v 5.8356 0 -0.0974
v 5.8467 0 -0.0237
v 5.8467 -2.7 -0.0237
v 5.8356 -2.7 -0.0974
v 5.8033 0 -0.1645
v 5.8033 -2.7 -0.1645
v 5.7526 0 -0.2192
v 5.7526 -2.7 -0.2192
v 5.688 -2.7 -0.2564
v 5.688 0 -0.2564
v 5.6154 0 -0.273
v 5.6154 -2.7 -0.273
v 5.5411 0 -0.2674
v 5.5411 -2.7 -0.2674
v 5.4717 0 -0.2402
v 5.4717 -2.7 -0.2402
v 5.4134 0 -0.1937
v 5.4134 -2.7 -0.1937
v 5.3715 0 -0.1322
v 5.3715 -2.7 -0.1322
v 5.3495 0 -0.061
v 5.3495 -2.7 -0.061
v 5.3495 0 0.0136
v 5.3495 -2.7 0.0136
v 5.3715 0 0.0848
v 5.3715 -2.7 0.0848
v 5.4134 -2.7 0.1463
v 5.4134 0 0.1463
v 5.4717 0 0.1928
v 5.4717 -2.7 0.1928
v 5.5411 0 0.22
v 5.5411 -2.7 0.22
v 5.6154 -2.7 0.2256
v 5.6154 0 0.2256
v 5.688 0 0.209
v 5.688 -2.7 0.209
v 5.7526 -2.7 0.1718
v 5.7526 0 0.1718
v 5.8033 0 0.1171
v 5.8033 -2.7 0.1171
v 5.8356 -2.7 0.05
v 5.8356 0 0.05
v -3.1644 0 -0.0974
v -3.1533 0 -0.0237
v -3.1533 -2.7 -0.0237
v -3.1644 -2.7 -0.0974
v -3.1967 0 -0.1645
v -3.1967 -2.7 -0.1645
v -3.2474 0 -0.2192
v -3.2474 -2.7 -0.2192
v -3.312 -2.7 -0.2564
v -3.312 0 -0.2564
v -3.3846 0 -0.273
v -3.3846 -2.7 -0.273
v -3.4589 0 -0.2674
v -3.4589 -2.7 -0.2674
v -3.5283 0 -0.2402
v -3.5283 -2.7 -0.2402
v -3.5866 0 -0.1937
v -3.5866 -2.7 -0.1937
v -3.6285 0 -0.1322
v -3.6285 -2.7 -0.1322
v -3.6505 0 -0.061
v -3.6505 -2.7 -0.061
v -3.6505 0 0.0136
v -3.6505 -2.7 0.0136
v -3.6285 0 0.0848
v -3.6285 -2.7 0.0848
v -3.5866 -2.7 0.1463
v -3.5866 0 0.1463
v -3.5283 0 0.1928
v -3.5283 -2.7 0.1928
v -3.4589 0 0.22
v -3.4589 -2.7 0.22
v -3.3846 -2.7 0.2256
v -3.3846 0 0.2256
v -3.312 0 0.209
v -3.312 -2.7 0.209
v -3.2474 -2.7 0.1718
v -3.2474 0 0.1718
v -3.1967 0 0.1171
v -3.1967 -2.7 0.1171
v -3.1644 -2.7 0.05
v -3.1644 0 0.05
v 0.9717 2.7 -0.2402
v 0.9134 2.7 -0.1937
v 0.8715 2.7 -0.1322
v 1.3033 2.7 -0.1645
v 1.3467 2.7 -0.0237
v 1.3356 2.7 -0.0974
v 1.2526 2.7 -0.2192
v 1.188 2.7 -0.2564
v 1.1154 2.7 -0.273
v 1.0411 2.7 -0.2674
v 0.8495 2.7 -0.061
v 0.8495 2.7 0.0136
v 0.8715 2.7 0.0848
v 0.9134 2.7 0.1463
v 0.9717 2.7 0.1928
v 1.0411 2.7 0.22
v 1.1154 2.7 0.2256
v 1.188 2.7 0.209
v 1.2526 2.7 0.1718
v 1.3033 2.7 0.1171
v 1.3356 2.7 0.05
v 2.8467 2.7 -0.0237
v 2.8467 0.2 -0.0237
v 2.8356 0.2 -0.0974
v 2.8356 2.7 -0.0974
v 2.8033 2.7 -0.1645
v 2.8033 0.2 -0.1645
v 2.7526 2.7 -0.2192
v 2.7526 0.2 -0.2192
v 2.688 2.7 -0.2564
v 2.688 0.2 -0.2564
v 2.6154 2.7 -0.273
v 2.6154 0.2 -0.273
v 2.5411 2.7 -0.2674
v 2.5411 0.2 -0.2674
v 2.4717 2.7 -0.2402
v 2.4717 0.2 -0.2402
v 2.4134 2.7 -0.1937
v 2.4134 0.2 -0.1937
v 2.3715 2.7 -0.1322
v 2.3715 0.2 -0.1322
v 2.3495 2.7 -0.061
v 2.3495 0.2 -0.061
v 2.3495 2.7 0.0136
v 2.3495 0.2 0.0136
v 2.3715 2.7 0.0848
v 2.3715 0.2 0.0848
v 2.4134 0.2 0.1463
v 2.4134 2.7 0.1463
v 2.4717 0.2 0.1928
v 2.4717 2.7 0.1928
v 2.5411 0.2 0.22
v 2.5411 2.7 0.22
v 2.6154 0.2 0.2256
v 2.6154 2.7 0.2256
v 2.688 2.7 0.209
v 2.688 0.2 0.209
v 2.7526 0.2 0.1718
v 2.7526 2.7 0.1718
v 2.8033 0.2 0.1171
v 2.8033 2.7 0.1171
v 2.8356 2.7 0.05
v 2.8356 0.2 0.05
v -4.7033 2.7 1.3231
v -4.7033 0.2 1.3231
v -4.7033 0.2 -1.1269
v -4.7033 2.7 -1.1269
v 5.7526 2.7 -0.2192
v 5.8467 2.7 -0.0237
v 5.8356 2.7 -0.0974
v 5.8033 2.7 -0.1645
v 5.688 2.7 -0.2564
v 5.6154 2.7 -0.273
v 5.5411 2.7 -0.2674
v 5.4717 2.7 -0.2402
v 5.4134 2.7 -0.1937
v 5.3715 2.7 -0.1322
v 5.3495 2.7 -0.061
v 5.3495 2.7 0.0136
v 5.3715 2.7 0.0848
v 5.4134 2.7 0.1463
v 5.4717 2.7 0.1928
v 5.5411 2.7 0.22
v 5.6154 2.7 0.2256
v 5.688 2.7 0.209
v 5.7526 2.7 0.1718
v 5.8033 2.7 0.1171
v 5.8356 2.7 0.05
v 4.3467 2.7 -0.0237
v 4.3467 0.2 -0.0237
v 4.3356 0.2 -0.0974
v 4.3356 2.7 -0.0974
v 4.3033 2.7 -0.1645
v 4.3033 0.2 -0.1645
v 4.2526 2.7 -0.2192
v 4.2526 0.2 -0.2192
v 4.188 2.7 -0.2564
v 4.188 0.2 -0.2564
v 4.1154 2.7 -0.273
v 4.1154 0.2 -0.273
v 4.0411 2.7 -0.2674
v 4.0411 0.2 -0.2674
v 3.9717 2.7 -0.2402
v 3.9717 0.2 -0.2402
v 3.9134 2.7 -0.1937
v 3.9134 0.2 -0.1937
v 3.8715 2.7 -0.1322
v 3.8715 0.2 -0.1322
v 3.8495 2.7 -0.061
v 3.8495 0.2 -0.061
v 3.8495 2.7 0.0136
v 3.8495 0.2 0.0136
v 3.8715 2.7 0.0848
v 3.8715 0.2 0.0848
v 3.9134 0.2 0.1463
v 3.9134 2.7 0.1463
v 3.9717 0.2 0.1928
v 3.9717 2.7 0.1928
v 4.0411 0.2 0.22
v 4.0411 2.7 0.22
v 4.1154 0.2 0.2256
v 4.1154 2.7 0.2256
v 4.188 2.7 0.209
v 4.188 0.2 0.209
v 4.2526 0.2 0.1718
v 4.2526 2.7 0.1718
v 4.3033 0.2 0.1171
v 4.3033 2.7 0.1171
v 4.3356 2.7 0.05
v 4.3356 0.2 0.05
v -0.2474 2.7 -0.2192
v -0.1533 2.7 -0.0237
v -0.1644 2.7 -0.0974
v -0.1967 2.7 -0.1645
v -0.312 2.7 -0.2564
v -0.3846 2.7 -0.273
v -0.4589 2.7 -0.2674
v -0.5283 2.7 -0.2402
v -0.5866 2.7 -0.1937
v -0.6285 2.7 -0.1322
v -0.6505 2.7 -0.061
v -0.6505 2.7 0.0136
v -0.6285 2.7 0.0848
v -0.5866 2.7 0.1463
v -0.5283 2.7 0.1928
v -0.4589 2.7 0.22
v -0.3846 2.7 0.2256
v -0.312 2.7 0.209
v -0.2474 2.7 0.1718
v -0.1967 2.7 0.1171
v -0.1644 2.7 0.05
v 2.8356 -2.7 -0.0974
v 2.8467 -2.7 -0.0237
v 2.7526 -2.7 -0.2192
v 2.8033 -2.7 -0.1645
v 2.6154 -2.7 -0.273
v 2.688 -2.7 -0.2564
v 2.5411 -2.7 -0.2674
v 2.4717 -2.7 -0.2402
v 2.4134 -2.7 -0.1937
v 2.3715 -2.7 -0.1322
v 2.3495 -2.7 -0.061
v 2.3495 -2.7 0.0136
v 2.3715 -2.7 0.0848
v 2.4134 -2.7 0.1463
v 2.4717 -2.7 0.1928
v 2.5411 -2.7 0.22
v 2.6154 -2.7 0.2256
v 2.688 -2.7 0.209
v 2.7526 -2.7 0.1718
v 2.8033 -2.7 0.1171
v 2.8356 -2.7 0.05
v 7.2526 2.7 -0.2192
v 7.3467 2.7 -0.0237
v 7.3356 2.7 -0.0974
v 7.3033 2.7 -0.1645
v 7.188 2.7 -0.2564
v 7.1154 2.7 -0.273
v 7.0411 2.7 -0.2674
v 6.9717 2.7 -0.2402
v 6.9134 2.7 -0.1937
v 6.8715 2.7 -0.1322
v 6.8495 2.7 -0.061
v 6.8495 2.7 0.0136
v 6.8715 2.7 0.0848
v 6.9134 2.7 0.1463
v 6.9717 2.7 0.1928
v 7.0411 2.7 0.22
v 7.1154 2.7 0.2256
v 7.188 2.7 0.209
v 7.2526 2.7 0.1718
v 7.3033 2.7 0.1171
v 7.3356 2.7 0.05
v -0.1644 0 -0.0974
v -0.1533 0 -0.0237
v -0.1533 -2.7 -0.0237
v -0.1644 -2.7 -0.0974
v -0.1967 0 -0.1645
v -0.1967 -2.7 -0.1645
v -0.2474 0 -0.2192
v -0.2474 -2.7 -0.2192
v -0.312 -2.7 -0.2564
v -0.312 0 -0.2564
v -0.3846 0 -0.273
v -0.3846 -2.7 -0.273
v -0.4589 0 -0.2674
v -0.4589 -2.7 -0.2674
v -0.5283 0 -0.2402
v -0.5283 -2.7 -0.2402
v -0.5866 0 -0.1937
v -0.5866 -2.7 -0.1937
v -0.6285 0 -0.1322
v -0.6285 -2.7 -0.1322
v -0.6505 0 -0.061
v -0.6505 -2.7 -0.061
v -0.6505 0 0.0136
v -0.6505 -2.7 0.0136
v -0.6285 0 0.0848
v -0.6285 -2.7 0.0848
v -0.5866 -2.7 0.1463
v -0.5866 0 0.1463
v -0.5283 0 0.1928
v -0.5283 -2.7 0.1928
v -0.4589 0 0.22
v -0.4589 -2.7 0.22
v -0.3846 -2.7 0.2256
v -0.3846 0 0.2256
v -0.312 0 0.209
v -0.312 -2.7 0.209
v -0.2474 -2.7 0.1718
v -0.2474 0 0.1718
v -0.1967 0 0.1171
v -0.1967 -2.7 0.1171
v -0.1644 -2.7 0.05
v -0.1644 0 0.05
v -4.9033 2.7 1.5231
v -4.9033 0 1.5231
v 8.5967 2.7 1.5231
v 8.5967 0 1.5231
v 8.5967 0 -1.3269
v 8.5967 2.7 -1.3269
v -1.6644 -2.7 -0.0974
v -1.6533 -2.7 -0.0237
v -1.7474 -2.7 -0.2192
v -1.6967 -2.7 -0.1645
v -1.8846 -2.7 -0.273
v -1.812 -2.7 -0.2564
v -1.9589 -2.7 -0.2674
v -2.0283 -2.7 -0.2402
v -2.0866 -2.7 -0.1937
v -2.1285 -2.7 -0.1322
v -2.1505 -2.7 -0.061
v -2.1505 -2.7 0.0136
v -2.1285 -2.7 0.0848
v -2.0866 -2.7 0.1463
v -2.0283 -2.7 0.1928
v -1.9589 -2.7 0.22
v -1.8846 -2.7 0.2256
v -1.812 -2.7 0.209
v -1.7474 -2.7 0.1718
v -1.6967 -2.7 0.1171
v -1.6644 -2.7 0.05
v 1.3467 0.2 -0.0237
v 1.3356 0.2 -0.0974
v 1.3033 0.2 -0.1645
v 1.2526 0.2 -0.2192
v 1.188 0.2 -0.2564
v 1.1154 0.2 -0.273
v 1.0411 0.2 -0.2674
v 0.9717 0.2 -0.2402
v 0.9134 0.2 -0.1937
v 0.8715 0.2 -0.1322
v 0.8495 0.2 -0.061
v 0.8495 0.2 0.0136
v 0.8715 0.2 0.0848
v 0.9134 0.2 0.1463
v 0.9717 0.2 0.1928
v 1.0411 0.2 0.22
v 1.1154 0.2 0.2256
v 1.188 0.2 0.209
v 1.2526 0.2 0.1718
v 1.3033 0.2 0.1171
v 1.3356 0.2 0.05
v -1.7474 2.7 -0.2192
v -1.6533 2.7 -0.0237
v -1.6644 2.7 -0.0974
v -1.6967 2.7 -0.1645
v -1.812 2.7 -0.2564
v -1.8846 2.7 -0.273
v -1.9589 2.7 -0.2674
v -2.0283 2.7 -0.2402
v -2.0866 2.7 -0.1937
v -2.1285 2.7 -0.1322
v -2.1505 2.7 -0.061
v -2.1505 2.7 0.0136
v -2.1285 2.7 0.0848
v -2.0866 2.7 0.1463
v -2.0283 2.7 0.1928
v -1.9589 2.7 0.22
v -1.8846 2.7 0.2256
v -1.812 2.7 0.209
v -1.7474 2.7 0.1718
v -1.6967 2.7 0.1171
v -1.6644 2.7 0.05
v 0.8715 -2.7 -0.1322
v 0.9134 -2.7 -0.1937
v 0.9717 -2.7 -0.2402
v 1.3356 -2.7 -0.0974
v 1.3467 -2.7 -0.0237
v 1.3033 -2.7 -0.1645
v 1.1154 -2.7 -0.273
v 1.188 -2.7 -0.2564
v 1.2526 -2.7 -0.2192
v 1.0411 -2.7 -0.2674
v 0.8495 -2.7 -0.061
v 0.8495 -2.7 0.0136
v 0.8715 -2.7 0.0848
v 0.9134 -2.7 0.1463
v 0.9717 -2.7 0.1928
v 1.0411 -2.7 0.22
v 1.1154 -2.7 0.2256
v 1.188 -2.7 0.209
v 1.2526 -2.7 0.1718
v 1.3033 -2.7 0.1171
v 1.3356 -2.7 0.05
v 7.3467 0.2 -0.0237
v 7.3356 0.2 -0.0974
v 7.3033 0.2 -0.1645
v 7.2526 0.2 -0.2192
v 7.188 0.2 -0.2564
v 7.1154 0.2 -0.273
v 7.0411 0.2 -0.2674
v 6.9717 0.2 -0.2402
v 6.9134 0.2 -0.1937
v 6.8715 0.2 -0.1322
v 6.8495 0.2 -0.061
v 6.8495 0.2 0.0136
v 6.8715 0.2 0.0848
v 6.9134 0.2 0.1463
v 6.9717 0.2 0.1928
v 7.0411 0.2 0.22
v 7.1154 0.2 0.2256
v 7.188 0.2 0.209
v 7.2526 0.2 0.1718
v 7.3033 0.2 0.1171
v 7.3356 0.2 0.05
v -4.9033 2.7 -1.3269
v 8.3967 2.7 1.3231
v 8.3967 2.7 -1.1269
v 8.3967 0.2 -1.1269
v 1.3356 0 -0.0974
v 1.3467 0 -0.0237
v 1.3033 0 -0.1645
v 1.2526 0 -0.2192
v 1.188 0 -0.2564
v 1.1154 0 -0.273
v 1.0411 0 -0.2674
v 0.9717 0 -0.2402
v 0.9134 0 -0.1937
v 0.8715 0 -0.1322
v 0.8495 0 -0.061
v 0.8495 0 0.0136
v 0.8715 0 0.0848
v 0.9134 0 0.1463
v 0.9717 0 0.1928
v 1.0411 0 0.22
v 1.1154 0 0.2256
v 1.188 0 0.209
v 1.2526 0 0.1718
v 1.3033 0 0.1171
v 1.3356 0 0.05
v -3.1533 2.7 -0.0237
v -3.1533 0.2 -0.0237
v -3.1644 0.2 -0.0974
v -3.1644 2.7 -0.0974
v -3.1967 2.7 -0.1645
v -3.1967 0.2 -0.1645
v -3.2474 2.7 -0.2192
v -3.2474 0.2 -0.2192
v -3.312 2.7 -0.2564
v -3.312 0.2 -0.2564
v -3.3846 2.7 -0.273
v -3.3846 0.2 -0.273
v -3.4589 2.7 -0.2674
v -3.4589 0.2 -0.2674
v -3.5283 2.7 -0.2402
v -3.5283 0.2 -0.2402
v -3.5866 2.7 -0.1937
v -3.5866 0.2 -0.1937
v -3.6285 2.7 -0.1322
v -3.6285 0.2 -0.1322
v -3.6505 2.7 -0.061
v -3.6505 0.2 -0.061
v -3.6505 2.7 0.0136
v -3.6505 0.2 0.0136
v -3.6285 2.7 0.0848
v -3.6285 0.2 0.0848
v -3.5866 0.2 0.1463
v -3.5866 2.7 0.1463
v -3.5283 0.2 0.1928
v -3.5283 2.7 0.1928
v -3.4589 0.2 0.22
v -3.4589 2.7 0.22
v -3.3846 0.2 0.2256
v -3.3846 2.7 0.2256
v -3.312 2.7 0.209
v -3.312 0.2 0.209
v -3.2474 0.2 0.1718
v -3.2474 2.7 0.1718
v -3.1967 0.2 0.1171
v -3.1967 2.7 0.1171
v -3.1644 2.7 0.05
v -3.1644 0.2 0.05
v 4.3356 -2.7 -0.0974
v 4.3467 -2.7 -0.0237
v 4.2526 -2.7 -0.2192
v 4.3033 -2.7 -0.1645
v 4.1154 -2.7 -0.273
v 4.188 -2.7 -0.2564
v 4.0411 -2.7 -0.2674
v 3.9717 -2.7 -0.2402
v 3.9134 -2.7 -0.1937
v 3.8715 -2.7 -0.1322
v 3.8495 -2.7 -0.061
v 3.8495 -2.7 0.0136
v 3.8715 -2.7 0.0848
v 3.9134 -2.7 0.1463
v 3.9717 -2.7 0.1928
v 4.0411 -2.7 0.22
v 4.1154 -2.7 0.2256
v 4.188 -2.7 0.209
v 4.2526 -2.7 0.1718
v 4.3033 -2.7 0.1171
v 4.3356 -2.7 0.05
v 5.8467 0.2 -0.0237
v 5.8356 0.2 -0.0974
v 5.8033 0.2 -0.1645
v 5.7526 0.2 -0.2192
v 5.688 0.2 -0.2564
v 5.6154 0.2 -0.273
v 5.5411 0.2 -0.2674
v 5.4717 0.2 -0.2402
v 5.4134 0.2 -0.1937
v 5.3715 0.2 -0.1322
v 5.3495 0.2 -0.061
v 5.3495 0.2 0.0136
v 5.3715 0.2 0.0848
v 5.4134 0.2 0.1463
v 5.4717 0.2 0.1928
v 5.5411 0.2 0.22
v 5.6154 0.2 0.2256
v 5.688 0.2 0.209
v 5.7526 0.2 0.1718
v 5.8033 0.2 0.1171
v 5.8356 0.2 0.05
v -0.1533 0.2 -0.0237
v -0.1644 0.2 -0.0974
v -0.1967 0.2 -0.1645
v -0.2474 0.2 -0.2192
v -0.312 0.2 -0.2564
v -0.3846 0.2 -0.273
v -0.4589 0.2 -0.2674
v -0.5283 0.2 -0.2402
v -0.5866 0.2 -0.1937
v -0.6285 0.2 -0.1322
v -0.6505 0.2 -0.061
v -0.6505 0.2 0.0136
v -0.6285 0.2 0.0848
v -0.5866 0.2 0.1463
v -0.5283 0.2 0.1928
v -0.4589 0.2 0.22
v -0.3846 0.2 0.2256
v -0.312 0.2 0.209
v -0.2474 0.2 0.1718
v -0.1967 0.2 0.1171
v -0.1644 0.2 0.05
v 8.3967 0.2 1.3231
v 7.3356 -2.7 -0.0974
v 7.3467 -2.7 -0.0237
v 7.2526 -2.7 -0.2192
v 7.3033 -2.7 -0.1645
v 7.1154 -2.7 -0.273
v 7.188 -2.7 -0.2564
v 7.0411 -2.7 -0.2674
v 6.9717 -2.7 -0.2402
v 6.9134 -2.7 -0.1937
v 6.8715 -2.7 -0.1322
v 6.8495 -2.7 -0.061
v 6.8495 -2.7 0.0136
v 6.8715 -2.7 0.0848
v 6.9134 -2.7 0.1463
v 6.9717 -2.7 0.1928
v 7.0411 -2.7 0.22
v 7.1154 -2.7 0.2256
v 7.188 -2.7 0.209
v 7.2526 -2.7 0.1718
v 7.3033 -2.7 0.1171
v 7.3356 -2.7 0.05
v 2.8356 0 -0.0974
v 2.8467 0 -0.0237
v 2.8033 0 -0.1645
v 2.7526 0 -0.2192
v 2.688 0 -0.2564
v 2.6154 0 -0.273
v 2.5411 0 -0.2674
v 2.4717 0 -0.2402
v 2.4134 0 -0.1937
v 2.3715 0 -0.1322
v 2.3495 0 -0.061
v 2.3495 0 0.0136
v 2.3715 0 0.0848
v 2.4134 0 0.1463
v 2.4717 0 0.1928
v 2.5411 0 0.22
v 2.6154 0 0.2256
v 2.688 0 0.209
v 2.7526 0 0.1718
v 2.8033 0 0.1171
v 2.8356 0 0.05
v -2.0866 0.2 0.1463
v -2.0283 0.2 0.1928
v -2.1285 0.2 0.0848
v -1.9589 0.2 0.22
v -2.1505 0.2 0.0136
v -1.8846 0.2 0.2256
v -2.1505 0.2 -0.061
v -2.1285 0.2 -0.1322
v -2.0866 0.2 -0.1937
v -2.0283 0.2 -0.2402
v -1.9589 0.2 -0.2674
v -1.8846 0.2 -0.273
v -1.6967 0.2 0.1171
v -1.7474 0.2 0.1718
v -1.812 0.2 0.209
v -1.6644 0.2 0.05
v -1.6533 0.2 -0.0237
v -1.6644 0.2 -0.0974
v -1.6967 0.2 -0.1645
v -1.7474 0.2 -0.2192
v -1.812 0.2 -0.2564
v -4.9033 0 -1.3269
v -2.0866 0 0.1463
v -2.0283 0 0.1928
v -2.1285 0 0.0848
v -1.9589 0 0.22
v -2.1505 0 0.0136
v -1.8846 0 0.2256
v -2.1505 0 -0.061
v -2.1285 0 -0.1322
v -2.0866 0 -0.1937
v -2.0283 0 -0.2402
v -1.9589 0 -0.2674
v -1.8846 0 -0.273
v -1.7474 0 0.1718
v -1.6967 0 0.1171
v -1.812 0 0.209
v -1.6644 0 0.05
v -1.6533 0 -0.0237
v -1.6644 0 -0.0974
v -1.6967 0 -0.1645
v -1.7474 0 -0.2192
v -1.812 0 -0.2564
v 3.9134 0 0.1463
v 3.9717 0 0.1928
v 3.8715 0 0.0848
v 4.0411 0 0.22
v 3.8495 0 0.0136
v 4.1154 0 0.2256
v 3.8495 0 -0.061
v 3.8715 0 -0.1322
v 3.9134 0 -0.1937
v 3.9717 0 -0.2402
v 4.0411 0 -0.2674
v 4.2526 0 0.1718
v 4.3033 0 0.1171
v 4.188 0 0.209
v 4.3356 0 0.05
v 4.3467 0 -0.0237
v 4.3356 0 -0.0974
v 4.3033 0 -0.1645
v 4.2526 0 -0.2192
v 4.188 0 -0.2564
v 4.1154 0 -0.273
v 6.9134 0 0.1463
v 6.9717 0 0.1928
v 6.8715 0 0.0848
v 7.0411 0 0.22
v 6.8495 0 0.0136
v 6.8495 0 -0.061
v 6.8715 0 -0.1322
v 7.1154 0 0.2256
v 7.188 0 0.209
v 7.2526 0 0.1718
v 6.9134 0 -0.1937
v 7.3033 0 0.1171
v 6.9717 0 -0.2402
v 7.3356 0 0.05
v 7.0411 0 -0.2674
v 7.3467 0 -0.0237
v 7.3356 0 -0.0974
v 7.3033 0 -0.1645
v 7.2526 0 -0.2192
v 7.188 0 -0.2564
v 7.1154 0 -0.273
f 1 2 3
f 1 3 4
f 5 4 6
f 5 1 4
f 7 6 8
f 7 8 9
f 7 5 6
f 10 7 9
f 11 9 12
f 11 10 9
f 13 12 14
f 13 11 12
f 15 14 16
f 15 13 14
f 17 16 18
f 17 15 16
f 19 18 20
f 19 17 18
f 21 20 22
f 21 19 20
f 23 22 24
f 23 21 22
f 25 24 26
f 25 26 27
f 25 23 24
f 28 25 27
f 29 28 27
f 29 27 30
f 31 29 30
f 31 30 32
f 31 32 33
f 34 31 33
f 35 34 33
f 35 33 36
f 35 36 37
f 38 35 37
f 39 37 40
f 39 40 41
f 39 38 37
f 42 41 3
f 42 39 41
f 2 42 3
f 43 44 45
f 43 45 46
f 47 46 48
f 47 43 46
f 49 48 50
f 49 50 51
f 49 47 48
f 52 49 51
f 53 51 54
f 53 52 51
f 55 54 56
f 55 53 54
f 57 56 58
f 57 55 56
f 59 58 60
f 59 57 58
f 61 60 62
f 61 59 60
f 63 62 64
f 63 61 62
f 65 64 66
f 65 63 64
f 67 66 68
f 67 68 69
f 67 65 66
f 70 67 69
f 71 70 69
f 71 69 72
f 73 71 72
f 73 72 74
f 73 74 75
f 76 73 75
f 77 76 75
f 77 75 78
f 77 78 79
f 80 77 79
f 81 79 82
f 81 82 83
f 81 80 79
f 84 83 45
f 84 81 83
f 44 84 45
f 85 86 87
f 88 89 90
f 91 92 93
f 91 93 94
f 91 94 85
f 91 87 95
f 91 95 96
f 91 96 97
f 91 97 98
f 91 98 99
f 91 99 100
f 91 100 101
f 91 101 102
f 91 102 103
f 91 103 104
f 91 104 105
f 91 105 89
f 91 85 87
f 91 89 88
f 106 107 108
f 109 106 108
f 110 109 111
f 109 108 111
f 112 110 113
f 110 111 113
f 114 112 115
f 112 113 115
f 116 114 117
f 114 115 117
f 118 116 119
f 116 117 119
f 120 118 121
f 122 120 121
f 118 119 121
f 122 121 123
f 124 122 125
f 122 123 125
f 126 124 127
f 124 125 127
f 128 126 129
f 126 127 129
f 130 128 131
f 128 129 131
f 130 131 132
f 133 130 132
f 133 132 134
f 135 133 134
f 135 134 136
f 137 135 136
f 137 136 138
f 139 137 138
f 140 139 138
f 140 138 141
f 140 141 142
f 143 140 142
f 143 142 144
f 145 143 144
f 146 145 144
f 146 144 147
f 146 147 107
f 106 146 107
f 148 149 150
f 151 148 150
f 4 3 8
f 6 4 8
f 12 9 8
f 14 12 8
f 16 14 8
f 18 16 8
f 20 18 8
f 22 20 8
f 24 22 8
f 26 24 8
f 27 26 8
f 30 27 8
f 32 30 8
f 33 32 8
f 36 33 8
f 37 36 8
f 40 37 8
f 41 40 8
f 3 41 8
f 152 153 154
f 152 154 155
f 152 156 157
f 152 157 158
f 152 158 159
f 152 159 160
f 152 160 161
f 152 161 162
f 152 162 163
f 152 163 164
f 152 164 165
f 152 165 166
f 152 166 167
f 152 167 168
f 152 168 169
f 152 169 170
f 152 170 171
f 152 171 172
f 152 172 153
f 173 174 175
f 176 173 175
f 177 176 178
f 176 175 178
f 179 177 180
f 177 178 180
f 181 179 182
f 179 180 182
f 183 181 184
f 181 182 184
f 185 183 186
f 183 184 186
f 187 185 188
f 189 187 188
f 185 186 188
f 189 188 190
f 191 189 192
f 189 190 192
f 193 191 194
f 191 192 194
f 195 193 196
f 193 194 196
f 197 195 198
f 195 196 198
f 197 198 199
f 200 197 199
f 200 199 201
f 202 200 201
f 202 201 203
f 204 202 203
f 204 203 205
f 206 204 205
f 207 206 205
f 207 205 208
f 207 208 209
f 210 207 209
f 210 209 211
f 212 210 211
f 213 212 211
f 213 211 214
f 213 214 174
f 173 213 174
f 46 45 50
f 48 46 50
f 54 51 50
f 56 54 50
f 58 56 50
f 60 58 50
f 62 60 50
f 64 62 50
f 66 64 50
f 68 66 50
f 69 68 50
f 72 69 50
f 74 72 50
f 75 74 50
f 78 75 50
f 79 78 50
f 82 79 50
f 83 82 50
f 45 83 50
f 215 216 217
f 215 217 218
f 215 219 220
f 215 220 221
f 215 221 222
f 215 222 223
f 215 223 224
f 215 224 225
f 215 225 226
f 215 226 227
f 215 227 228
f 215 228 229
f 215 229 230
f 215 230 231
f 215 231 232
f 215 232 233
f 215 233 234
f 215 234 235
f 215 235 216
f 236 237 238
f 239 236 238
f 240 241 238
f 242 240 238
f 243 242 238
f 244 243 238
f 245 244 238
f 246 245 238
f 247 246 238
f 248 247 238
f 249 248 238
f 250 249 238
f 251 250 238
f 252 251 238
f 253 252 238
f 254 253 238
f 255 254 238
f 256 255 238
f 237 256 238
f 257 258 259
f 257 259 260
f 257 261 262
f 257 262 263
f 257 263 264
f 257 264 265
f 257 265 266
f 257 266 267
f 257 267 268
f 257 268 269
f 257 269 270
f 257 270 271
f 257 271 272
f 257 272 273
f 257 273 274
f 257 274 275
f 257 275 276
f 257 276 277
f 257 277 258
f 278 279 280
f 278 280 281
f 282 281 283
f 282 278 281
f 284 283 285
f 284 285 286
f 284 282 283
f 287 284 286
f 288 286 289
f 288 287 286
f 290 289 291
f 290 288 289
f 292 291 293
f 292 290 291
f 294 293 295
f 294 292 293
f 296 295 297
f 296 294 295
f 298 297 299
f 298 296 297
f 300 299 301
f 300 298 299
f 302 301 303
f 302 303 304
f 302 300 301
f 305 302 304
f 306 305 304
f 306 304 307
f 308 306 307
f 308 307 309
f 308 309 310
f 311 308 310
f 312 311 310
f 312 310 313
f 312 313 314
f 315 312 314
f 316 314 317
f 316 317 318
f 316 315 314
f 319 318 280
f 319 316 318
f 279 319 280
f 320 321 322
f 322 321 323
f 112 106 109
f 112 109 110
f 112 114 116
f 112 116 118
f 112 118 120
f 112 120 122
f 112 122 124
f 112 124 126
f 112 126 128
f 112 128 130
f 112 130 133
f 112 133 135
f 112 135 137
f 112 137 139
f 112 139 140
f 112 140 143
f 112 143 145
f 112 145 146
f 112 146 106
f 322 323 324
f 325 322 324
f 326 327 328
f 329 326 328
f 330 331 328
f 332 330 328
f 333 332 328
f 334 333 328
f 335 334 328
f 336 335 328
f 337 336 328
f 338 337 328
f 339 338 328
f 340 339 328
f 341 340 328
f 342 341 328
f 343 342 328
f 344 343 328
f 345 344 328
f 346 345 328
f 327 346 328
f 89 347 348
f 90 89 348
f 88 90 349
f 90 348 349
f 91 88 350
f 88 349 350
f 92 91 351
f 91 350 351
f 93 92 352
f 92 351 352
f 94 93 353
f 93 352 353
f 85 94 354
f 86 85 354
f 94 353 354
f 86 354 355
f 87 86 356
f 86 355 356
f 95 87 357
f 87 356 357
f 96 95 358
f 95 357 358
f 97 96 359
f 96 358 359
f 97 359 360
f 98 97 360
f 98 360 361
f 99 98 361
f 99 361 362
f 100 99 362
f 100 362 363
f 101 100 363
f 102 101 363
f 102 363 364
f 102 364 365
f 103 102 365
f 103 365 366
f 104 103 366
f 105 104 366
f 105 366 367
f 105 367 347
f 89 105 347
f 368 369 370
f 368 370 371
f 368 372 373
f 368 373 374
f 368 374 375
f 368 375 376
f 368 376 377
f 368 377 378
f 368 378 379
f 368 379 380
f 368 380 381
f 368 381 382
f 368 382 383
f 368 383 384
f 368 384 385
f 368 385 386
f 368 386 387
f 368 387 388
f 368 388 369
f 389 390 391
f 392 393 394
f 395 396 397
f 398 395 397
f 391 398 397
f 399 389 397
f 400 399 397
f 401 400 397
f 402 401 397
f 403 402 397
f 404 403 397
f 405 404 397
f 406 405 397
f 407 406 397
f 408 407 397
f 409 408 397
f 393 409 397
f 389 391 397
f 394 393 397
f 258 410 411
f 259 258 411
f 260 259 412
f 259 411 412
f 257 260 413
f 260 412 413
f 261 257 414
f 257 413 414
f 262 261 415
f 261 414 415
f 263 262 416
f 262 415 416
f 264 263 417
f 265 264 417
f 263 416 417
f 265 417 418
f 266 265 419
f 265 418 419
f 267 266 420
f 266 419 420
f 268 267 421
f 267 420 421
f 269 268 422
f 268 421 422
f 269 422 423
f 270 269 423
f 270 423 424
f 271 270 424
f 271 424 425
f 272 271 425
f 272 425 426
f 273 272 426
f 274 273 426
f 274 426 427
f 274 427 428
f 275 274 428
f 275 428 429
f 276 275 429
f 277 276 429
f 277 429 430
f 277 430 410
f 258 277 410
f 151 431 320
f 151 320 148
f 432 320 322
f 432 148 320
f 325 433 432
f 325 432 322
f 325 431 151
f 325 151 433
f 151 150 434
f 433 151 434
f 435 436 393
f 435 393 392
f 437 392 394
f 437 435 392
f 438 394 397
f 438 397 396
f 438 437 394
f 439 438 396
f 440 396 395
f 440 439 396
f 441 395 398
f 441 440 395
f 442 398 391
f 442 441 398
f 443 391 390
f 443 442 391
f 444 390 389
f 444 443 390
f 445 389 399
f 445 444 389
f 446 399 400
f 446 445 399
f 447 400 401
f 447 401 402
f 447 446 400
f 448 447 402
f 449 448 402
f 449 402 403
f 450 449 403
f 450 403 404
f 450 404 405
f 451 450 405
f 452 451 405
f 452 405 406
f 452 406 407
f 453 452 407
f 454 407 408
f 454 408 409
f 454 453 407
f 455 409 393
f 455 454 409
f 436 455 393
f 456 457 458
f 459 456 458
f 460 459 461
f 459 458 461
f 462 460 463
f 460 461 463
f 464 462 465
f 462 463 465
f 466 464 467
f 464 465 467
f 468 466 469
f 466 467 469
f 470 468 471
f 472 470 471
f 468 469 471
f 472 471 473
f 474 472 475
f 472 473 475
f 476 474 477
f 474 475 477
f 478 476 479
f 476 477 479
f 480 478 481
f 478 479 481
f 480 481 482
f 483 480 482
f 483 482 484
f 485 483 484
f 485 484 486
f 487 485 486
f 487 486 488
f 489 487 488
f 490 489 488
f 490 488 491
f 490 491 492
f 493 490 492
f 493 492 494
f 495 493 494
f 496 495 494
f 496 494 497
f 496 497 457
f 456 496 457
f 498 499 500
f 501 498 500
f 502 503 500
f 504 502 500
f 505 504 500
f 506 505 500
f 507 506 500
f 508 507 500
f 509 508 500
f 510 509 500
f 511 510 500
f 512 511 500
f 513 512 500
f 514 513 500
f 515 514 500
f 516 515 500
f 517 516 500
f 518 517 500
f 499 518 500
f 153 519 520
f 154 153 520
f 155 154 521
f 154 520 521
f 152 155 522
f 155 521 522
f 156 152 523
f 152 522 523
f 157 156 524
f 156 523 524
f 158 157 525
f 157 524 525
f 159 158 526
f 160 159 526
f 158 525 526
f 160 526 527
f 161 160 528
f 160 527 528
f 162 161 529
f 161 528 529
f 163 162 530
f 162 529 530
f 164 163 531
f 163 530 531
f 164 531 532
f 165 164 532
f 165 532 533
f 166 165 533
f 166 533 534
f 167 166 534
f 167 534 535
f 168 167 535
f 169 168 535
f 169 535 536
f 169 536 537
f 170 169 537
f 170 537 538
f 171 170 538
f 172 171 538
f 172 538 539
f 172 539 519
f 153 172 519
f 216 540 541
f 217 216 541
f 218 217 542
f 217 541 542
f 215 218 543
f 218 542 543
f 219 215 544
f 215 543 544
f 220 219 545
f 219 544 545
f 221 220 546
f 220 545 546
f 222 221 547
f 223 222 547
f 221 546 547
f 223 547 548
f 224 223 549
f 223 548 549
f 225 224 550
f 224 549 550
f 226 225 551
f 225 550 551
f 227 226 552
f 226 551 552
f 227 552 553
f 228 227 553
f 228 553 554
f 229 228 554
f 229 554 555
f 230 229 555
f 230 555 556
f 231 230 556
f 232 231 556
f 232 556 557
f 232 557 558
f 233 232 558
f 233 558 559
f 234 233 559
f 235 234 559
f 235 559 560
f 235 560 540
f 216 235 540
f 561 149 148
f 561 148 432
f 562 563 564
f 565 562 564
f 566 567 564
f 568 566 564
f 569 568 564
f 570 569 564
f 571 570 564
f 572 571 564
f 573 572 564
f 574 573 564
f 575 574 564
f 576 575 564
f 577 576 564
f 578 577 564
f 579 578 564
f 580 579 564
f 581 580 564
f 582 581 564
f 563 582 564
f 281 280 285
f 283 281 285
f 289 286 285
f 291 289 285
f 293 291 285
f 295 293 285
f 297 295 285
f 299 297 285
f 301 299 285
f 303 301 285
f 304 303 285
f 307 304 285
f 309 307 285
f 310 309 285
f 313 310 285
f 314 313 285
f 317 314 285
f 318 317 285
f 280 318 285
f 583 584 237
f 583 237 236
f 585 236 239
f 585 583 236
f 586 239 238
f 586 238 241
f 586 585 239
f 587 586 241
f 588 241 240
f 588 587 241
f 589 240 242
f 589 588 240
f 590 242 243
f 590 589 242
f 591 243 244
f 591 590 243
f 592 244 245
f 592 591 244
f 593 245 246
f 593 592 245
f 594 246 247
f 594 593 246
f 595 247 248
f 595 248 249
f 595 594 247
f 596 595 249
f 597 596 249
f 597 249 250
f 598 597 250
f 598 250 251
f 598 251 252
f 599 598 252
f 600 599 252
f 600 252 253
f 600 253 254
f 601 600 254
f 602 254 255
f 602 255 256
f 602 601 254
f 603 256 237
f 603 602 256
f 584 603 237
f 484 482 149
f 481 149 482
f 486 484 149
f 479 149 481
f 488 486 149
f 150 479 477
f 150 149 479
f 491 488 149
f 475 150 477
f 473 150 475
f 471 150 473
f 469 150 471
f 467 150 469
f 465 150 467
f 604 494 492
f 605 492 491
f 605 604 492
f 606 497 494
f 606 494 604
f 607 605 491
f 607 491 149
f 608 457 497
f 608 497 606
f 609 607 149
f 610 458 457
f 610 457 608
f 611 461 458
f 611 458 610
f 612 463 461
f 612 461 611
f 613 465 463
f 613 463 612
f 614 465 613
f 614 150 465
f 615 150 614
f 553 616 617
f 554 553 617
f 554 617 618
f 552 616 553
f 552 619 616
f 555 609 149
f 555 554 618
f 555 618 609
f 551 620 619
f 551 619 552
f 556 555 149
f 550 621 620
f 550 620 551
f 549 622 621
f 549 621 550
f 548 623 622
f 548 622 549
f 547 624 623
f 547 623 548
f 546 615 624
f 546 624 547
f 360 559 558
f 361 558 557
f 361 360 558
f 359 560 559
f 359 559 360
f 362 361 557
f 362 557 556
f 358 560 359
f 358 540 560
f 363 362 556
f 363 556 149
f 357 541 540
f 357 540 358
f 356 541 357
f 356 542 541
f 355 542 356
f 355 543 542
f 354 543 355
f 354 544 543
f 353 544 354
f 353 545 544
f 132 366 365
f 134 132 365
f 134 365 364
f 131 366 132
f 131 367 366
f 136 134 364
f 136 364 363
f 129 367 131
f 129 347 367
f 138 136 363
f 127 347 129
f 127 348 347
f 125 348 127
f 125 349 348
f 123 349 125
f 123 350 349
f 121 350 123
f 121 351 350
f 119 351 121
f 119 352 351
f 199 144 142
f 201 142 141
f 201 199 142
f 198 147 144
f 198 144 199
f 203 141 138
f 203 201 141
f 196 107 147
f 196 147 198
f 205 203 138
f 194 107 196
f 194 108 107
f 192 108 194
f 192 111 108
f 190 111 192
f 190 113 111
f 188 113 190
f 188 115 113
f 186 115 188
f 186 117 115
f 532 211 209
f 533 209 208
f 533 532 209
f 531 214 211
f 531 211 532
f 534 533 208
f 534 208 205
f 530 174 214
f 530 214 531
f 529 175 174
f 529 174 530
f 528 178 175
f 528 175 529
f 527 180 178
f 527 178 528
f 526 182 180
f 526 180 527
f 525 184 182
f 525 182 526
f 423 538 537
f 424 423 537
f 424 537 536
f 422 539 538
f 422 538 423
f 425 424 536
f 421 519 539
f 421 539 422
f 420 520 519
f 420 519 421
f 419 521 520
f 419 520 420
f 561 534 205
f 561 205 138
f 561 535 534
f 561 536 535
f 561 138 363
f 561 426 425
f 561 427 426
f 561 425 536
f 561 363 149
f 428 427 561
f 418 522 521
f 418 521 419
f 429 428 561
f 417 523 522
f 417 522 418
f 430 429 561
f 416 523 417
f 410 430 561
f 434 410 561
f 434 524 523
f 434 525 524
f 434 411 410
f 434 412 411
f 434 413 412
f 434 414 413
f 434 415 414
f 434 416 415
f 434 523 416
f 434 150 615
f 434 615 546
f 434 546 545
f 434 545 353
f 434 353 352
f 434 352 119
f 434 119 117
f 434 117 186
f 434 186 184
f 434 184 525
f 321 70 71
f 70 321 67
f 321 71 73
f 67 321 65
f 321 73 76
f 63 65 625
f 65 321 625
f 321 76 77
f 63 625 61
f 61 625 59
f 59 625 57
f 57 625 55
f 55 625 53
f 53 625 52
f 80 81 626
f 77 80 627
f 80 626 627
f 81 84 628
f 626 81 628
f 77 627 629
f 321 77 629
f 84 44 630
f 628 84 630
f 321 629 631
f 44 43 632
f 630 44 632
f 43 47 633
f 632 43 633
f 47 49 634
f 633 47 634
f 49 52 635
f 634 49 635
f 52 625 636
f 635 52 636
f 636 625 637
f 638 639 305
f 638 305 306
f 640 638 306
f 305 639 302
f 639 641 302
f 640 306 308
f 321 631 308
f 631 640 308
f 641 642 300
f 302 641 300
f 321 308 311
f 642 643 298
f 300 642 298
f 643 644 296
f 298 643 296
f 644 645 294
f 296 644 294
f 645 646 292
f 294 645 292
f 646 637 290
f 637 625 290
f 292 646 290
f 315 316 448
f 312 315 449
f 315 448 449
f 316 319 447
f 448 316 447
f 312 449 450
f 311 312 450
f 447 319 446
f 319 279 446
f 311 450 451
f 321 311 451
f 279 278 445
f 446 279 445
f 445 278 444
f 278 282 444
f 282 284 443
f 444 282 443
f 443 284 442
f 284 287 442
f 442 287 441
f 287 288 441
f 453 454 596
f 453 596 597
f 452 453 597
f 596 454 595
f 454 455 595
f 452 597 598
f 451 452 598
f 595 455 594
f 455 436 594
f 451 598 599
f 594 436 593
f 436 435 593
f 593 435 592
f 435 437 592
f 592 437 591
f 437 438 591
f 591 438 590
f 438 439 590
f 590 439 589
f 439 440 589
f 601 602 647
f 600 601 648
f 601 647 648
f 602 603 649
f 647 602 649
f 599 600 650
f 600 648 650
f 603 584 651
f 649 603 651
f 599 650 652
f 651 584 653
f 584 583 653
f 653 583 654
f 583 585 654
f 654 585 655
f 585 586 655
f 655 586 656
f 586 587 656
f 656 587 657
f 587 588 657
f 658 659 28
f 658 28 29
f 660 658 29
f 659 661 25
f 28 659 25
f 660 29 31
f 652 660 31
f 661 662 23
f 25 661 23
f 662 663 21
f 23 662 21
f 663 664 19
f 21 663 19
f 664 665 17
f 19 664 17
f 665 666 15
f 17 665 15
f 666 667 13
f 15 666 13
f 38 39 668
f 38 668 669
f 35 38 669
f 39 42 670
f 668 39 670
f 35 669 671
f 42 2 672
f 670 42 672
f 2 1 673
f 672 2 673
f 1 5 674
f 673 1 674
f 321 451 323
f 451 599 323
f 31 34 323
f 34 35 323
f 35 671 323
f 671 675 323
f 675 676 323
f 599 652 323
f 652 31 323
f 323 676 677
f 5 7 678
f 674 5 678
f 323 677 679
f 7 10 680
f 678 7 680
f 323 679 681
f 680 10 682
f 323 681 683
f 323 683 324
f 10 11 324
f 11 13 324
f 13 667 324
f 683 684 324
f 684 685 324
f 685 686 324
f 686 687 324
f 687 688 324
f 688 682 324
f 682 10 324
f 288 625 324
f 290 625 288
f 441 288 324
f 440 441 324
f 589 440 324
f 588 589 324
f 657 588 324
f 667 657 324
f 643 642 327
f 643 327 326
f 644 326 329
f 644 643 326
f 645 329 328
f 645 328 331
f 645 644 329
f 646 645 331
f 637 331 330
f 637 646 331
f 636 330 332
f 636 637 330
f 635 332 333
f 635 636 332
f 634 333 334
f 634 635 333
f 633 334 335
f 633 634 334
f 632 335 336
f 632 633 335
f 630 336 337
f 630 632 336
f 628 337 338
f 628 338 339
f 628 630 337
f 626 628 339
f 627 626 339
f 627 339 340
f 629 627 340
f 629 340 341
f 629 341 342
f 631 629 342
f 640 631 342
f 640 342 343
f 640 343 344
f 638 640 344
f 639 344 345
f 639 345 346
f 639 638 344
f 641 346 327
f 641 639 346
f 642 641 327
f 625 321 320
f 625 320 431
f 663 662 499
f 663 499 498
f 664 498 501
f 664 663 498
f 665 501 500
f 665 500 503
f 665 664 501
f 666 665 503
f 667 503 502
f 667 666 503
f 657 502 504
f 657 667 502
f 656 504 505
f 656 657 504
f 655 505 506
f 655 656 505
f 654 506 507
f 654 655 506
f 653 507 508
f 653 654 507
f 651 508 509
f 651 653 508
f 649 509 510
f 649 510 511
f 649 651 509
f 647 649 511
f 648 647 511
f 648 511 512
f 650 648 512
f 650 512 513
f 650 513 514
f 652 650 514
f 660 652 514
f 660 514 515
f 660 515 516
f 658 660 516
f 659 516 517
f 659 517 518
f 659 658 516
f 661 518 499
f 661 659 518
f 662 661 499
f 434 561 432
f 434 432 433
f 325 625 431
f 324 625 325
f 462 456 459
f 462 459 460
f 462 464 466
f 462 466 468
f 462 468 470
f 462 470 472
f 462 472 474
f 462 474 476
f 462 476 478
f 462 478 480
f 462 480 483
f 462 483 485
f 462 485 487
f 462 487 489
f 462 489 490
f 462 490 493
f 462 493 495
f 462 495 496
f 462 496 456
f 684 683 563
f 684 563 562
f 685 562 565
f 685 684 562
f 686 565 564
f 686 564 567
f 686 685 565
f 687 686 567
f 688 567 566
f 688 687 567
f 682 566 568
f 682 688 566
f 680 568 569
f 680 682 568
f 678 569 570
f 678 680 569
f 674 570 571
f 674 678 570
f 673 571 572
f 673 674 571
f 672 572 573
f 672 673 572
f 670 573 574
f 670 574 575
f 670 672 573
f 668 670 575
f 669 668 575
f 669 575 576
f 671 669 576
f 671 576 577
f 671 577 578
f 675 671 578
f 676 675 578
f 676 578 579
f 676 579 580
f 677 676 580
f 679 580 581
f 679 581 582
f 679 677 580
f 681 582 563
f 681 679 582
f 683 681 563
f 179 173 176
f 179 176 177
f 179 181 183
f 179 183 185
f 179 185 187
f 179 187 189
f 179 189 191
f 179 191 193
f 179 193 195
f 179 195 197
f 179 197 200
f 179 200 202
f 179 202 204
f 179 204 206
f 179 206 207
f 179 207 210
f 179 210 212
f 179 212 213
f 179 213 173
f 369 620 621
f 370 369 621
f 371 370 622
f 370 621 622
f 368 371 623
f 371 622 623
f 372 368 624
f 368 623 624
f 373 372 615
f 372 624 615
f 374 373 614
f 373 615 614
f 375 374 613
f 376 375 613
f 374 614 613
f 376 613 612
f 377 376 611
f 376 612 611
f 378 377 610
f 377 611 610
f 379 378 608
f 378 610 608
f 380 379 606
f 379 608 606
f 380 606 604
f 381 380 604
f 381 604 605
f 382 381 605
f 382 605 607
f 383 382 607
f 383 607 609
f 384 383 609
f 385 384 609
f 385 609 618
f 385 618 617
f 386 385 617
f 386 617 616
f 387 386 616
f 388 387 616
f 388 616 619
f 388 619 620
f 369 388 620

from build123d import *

# Parameters (mm, degrees)
SKETCH1_R             = 0.25
BOSS_EXTRUDE1_DEPTH   = 2.7
BOSS_EXTRUDE1_2_DEPTH = 2.7
BOSS_EXTRUDE1_3_DEPTH = 2.7
BOSS_EXTRUDE1_4_DEPTH = 2.7
BOSS_EXTRUDE1_5_DEPTH = 2.7
BOSS_EXTRUDE1_6_DEPTH = 2.7
BOSS_EXTRUDE1_7_DEPTH = 2.7
BOSS_EXTRUDE1_8_DEPTH = 2.7
SKETCH1_7_W           = 13.5
SKETCH1_7_H           = 2.85
SKETCH1_7_W_2         = 13.1
SKETCH1_7_H_2         = 2.45
BOSS_EXTRUDE3_DEPTH   = 2.7
BOSS_EXTRUDE4_START   = 0.2
SKETCH1_8_W           = 13.1
SKETCH1_8_H           = 2.45
SKETCH1_8_R           = 0.25
BOSS_EXTRUDE4_DEPTH   = 0.2
BOSS_EXTRUDE5_START   = 2.7
SKETCH1_9_R           = 0.25
BOSS_EXTRUDE5_DEPTH   = 2.7


with BuildPart() as part:
    # Sketch1 → Boss-Extrude1 (new body)
    with BuildSketch(Plane(origin=(0, 0, 0), x_dir=(1, 0, 0), z_dir=(0, 1, 0))):
        with Locations((-3.403301887, 0.02370283)):
            Circle(SKETCH1_R)
    extrude(amount=-BOSS_EXTRUDE1_DEPTH)



with BuildPart() as body_2:
    # Sketch1 → Boss-Extrude1 2 (new body)
    with BuildSketch(Plane(origin=(0, 0, 0), x_dir=(1, 0, 0), z_dir=(0, 1, 0))):
        with Locations((-1.903301887, 0.02370283)):
            Circle(SKETCH1_R)
    extrude(amount=-BOSS_EXTRUDE1_2_DEPTH)


with BuildPart() as body_3:
    # Sketch1 → Boss-Extrude1 3 (new body)
    with BuildSketch(Plane(origin=(0, 0, 0), x_dir=(1, 0, 0), z_dir=(0, 1, 0))):
        with Locations((-0.403301887, 0.02370283)):
            Circle(SKETCH1_R)
    extrude(amount=-BOSS_EXTRUDE1_3_DEPTH)


with BuildPart() as body_4:
    # Sketch1 → Boss-Extrude1 4 (new body)
    with BuildSketch(Plane(origin=(0, 0, 0), x_dir=(1, 0, 0), z_dir=(0, 1, 0))):
        with Locations((1.096698113, 0.02370283)):
            Circle(SKETCH1_R)
    extrude(amount=-BOSS_EXTRUDE1_4_DEPTH)


with BuildPart() as body_5:
    # Sketch1 → Boss-Extrude1 5 (new body)
    with BuildSketch(Plane(origin=(0, 0, 0), x_dir=(1, 0, 0), z_dir=(0, 1, 0))):
        with Locations((2.596698113, 0.02370283)):
            Circle(SKETCH1_R)
    extrude(amount=-BOSS_EXTRUDE1_5_DEPTH)


with BuildPart() as body_6:
    # Sketch1 → Boss-Extrude1 6 (new body)
    with BuildSketch(Plane(origin=(0, 0, 0), x_dir=(1, 0, 0), z_dir=(0, 1, 0))):
        with Locations((4.096698113, 0.02370283)):
            Circle(SKETCH1_R)
    extrude(amount=-BOSS_EXTRUDE1_6_DEPTH)


with BuildPart() as body_7:
    # Sketch1 → Boss-Extrude1 7 (new body)
    with BuildSketch(Plane(origin=(0, 0, 0), x_dir=(1, 0, 0), z_dir=(0, 1, 0))):
        with Locations((5.596698113, 0.02370283)):
            Circle(SKETCH1_R)
    extrude(amount=-BOSS_EXTRUDE1_7_DEPTH)


with BuildPart() as body_8:
    # Sketch1 → Boss-Extrude1 8 (new body)
    with BuildSketch(Plane(origin=(0, 0, 0), x_dir=(1, 0, 0), z_dir=(0, 1, 0))):
        with Locations((7.096698113, 0.02370283)):
            Circle(SKETCH1_R)
    extrude(amount=-BOSS_EXTRUDE1_8_DEPTH)


with BuildPart() as body_9:
    # Sketch1<7> → Boss-Extrude3 (new body)
    with BuildSketch(Plane(origin=(0, 0, 0), x_dir=(1, 0, 0), z_dir=(0, 1, 0))):
        with Locations((1.846698113, -0.098128497)):
            Rectangle(SKETCH1_7_W, SKETCH1_7_H)
        with Locations((1.846698113, -0.098128497)):
            Rectangle(SKETCH1_7_W_2, SKETCH1_7_H_2, mode=Mode.SUBTRACT)
    extrude(amount=BOSS_EXTRUDE3_DEPTH)

    # Sketch1<8> → Boss-Extrude4 (add)
    with BuildSketch(Plane(origin=(0, 0, 0), x_dir=(1, 0, 0), z_dir=(0, 1, 0)).offset(BOSS_EXTRUDE4_START)):
        with Locations((1.846698113, -0.098128497)):
            Rectangle(SKETCH1_8_W, SKETCH1_8_H)
        with Locations((-3.403301887, 0.02370283)):
            Circle(SKETCH1_8_R, mode=Mode.SUBTRACT)
        with Locations((-1.903301887, 0.02370283)):
            Circle(SKETCH1_8_R, mode=Mode.SUBTRACT)
        with Locations((-0.403301887, 0.02370283)):
            Circle(SKETCH1_8_R, mode=Mode.SUBTRACT)
        with Locations((1.096698113, 0.02370283)):
            Circle(SKETCH1_8_R, mode=Mode.SUBTRACT)
        with Locations((2.596698113, 0.02370283)):
            Circle(SKETCH1_8_R, mode=Mode.SUBTRACT)
        with Locations((4.096698113, 0.02370283)):
            Circle(SKETCH1_8_R, mode=Mode.SUBTRACT)
        with Locations((5.596698113, 0.02370283)):
            Circle(SKETCH1_8_R, mode=Mode.SUBTRACT)
        with Locations((7.096698113, 0.02370283)):
            Circle(SKETCH1_8_R, mode=Mode.SUBTRACT)
    extrude(amount=-BOSS_EXTRUDE4_DEPTH)


with BuildPart() as part_1:
    add(part.part)

    add(body_2.part)  # Boss-Extrude5 merges body 2

    add(body_3.part)  # Boss-Extrude5 merges body 3

    add(body_4.part)  # Boss-Extrude5 merges body 4

    add(body_5.part)  # Boss-Extrude5 merges body 5

    add(body_6.part)  # Boss-Extrude5 merges body 6

    add(body_7.part)  # Boss-Extrude5 merges body 7

    add(body_8.part)  # Boss-Extrude5 merges body 8

    add(body_9.part)  # Boss-Extrude5 merges body 9
    # Sketch1<9> → Boss-Extrude5 (add)
    with BuildSketch(Plane(origin=(0, 0, 0), x_dir=(1, 0, 0), z_dir=(0, 1, 0)).offset(BOSS_EXTRUDE5_START)):
        with Locations((-3.403301887, 0.02370283)):
            Circle(SKETCH1_9_R)
        with Locations((-1.903301887, 0.02370283)):
            Circle(SKETCH1_9_R)
        with Locations((-0.403301887, 0.02370283)):
            Circle(SKETCH1_9_R)
        with Locations((1.096698113, 0.02370283)):
            Circle(SKETCH1_9_R)
        with Locations((2.596698113, 0.02370283)):
            Circle(SKETCH1_9_R)
        with Locations((4.096698113, 0.02370283)):
            Circle(SKETCH1_9_R)
        with Locations((5.596698113, 0.02370283)):
            Circle(SKETCH1_9_R)
        with Locations((7.096698113, 0.02370283)):
            Circle(SKETCH1_9_R)
    extrude(amount=-BOSS_EXTRUDE5_DEPTH)


solid = part_1.part
